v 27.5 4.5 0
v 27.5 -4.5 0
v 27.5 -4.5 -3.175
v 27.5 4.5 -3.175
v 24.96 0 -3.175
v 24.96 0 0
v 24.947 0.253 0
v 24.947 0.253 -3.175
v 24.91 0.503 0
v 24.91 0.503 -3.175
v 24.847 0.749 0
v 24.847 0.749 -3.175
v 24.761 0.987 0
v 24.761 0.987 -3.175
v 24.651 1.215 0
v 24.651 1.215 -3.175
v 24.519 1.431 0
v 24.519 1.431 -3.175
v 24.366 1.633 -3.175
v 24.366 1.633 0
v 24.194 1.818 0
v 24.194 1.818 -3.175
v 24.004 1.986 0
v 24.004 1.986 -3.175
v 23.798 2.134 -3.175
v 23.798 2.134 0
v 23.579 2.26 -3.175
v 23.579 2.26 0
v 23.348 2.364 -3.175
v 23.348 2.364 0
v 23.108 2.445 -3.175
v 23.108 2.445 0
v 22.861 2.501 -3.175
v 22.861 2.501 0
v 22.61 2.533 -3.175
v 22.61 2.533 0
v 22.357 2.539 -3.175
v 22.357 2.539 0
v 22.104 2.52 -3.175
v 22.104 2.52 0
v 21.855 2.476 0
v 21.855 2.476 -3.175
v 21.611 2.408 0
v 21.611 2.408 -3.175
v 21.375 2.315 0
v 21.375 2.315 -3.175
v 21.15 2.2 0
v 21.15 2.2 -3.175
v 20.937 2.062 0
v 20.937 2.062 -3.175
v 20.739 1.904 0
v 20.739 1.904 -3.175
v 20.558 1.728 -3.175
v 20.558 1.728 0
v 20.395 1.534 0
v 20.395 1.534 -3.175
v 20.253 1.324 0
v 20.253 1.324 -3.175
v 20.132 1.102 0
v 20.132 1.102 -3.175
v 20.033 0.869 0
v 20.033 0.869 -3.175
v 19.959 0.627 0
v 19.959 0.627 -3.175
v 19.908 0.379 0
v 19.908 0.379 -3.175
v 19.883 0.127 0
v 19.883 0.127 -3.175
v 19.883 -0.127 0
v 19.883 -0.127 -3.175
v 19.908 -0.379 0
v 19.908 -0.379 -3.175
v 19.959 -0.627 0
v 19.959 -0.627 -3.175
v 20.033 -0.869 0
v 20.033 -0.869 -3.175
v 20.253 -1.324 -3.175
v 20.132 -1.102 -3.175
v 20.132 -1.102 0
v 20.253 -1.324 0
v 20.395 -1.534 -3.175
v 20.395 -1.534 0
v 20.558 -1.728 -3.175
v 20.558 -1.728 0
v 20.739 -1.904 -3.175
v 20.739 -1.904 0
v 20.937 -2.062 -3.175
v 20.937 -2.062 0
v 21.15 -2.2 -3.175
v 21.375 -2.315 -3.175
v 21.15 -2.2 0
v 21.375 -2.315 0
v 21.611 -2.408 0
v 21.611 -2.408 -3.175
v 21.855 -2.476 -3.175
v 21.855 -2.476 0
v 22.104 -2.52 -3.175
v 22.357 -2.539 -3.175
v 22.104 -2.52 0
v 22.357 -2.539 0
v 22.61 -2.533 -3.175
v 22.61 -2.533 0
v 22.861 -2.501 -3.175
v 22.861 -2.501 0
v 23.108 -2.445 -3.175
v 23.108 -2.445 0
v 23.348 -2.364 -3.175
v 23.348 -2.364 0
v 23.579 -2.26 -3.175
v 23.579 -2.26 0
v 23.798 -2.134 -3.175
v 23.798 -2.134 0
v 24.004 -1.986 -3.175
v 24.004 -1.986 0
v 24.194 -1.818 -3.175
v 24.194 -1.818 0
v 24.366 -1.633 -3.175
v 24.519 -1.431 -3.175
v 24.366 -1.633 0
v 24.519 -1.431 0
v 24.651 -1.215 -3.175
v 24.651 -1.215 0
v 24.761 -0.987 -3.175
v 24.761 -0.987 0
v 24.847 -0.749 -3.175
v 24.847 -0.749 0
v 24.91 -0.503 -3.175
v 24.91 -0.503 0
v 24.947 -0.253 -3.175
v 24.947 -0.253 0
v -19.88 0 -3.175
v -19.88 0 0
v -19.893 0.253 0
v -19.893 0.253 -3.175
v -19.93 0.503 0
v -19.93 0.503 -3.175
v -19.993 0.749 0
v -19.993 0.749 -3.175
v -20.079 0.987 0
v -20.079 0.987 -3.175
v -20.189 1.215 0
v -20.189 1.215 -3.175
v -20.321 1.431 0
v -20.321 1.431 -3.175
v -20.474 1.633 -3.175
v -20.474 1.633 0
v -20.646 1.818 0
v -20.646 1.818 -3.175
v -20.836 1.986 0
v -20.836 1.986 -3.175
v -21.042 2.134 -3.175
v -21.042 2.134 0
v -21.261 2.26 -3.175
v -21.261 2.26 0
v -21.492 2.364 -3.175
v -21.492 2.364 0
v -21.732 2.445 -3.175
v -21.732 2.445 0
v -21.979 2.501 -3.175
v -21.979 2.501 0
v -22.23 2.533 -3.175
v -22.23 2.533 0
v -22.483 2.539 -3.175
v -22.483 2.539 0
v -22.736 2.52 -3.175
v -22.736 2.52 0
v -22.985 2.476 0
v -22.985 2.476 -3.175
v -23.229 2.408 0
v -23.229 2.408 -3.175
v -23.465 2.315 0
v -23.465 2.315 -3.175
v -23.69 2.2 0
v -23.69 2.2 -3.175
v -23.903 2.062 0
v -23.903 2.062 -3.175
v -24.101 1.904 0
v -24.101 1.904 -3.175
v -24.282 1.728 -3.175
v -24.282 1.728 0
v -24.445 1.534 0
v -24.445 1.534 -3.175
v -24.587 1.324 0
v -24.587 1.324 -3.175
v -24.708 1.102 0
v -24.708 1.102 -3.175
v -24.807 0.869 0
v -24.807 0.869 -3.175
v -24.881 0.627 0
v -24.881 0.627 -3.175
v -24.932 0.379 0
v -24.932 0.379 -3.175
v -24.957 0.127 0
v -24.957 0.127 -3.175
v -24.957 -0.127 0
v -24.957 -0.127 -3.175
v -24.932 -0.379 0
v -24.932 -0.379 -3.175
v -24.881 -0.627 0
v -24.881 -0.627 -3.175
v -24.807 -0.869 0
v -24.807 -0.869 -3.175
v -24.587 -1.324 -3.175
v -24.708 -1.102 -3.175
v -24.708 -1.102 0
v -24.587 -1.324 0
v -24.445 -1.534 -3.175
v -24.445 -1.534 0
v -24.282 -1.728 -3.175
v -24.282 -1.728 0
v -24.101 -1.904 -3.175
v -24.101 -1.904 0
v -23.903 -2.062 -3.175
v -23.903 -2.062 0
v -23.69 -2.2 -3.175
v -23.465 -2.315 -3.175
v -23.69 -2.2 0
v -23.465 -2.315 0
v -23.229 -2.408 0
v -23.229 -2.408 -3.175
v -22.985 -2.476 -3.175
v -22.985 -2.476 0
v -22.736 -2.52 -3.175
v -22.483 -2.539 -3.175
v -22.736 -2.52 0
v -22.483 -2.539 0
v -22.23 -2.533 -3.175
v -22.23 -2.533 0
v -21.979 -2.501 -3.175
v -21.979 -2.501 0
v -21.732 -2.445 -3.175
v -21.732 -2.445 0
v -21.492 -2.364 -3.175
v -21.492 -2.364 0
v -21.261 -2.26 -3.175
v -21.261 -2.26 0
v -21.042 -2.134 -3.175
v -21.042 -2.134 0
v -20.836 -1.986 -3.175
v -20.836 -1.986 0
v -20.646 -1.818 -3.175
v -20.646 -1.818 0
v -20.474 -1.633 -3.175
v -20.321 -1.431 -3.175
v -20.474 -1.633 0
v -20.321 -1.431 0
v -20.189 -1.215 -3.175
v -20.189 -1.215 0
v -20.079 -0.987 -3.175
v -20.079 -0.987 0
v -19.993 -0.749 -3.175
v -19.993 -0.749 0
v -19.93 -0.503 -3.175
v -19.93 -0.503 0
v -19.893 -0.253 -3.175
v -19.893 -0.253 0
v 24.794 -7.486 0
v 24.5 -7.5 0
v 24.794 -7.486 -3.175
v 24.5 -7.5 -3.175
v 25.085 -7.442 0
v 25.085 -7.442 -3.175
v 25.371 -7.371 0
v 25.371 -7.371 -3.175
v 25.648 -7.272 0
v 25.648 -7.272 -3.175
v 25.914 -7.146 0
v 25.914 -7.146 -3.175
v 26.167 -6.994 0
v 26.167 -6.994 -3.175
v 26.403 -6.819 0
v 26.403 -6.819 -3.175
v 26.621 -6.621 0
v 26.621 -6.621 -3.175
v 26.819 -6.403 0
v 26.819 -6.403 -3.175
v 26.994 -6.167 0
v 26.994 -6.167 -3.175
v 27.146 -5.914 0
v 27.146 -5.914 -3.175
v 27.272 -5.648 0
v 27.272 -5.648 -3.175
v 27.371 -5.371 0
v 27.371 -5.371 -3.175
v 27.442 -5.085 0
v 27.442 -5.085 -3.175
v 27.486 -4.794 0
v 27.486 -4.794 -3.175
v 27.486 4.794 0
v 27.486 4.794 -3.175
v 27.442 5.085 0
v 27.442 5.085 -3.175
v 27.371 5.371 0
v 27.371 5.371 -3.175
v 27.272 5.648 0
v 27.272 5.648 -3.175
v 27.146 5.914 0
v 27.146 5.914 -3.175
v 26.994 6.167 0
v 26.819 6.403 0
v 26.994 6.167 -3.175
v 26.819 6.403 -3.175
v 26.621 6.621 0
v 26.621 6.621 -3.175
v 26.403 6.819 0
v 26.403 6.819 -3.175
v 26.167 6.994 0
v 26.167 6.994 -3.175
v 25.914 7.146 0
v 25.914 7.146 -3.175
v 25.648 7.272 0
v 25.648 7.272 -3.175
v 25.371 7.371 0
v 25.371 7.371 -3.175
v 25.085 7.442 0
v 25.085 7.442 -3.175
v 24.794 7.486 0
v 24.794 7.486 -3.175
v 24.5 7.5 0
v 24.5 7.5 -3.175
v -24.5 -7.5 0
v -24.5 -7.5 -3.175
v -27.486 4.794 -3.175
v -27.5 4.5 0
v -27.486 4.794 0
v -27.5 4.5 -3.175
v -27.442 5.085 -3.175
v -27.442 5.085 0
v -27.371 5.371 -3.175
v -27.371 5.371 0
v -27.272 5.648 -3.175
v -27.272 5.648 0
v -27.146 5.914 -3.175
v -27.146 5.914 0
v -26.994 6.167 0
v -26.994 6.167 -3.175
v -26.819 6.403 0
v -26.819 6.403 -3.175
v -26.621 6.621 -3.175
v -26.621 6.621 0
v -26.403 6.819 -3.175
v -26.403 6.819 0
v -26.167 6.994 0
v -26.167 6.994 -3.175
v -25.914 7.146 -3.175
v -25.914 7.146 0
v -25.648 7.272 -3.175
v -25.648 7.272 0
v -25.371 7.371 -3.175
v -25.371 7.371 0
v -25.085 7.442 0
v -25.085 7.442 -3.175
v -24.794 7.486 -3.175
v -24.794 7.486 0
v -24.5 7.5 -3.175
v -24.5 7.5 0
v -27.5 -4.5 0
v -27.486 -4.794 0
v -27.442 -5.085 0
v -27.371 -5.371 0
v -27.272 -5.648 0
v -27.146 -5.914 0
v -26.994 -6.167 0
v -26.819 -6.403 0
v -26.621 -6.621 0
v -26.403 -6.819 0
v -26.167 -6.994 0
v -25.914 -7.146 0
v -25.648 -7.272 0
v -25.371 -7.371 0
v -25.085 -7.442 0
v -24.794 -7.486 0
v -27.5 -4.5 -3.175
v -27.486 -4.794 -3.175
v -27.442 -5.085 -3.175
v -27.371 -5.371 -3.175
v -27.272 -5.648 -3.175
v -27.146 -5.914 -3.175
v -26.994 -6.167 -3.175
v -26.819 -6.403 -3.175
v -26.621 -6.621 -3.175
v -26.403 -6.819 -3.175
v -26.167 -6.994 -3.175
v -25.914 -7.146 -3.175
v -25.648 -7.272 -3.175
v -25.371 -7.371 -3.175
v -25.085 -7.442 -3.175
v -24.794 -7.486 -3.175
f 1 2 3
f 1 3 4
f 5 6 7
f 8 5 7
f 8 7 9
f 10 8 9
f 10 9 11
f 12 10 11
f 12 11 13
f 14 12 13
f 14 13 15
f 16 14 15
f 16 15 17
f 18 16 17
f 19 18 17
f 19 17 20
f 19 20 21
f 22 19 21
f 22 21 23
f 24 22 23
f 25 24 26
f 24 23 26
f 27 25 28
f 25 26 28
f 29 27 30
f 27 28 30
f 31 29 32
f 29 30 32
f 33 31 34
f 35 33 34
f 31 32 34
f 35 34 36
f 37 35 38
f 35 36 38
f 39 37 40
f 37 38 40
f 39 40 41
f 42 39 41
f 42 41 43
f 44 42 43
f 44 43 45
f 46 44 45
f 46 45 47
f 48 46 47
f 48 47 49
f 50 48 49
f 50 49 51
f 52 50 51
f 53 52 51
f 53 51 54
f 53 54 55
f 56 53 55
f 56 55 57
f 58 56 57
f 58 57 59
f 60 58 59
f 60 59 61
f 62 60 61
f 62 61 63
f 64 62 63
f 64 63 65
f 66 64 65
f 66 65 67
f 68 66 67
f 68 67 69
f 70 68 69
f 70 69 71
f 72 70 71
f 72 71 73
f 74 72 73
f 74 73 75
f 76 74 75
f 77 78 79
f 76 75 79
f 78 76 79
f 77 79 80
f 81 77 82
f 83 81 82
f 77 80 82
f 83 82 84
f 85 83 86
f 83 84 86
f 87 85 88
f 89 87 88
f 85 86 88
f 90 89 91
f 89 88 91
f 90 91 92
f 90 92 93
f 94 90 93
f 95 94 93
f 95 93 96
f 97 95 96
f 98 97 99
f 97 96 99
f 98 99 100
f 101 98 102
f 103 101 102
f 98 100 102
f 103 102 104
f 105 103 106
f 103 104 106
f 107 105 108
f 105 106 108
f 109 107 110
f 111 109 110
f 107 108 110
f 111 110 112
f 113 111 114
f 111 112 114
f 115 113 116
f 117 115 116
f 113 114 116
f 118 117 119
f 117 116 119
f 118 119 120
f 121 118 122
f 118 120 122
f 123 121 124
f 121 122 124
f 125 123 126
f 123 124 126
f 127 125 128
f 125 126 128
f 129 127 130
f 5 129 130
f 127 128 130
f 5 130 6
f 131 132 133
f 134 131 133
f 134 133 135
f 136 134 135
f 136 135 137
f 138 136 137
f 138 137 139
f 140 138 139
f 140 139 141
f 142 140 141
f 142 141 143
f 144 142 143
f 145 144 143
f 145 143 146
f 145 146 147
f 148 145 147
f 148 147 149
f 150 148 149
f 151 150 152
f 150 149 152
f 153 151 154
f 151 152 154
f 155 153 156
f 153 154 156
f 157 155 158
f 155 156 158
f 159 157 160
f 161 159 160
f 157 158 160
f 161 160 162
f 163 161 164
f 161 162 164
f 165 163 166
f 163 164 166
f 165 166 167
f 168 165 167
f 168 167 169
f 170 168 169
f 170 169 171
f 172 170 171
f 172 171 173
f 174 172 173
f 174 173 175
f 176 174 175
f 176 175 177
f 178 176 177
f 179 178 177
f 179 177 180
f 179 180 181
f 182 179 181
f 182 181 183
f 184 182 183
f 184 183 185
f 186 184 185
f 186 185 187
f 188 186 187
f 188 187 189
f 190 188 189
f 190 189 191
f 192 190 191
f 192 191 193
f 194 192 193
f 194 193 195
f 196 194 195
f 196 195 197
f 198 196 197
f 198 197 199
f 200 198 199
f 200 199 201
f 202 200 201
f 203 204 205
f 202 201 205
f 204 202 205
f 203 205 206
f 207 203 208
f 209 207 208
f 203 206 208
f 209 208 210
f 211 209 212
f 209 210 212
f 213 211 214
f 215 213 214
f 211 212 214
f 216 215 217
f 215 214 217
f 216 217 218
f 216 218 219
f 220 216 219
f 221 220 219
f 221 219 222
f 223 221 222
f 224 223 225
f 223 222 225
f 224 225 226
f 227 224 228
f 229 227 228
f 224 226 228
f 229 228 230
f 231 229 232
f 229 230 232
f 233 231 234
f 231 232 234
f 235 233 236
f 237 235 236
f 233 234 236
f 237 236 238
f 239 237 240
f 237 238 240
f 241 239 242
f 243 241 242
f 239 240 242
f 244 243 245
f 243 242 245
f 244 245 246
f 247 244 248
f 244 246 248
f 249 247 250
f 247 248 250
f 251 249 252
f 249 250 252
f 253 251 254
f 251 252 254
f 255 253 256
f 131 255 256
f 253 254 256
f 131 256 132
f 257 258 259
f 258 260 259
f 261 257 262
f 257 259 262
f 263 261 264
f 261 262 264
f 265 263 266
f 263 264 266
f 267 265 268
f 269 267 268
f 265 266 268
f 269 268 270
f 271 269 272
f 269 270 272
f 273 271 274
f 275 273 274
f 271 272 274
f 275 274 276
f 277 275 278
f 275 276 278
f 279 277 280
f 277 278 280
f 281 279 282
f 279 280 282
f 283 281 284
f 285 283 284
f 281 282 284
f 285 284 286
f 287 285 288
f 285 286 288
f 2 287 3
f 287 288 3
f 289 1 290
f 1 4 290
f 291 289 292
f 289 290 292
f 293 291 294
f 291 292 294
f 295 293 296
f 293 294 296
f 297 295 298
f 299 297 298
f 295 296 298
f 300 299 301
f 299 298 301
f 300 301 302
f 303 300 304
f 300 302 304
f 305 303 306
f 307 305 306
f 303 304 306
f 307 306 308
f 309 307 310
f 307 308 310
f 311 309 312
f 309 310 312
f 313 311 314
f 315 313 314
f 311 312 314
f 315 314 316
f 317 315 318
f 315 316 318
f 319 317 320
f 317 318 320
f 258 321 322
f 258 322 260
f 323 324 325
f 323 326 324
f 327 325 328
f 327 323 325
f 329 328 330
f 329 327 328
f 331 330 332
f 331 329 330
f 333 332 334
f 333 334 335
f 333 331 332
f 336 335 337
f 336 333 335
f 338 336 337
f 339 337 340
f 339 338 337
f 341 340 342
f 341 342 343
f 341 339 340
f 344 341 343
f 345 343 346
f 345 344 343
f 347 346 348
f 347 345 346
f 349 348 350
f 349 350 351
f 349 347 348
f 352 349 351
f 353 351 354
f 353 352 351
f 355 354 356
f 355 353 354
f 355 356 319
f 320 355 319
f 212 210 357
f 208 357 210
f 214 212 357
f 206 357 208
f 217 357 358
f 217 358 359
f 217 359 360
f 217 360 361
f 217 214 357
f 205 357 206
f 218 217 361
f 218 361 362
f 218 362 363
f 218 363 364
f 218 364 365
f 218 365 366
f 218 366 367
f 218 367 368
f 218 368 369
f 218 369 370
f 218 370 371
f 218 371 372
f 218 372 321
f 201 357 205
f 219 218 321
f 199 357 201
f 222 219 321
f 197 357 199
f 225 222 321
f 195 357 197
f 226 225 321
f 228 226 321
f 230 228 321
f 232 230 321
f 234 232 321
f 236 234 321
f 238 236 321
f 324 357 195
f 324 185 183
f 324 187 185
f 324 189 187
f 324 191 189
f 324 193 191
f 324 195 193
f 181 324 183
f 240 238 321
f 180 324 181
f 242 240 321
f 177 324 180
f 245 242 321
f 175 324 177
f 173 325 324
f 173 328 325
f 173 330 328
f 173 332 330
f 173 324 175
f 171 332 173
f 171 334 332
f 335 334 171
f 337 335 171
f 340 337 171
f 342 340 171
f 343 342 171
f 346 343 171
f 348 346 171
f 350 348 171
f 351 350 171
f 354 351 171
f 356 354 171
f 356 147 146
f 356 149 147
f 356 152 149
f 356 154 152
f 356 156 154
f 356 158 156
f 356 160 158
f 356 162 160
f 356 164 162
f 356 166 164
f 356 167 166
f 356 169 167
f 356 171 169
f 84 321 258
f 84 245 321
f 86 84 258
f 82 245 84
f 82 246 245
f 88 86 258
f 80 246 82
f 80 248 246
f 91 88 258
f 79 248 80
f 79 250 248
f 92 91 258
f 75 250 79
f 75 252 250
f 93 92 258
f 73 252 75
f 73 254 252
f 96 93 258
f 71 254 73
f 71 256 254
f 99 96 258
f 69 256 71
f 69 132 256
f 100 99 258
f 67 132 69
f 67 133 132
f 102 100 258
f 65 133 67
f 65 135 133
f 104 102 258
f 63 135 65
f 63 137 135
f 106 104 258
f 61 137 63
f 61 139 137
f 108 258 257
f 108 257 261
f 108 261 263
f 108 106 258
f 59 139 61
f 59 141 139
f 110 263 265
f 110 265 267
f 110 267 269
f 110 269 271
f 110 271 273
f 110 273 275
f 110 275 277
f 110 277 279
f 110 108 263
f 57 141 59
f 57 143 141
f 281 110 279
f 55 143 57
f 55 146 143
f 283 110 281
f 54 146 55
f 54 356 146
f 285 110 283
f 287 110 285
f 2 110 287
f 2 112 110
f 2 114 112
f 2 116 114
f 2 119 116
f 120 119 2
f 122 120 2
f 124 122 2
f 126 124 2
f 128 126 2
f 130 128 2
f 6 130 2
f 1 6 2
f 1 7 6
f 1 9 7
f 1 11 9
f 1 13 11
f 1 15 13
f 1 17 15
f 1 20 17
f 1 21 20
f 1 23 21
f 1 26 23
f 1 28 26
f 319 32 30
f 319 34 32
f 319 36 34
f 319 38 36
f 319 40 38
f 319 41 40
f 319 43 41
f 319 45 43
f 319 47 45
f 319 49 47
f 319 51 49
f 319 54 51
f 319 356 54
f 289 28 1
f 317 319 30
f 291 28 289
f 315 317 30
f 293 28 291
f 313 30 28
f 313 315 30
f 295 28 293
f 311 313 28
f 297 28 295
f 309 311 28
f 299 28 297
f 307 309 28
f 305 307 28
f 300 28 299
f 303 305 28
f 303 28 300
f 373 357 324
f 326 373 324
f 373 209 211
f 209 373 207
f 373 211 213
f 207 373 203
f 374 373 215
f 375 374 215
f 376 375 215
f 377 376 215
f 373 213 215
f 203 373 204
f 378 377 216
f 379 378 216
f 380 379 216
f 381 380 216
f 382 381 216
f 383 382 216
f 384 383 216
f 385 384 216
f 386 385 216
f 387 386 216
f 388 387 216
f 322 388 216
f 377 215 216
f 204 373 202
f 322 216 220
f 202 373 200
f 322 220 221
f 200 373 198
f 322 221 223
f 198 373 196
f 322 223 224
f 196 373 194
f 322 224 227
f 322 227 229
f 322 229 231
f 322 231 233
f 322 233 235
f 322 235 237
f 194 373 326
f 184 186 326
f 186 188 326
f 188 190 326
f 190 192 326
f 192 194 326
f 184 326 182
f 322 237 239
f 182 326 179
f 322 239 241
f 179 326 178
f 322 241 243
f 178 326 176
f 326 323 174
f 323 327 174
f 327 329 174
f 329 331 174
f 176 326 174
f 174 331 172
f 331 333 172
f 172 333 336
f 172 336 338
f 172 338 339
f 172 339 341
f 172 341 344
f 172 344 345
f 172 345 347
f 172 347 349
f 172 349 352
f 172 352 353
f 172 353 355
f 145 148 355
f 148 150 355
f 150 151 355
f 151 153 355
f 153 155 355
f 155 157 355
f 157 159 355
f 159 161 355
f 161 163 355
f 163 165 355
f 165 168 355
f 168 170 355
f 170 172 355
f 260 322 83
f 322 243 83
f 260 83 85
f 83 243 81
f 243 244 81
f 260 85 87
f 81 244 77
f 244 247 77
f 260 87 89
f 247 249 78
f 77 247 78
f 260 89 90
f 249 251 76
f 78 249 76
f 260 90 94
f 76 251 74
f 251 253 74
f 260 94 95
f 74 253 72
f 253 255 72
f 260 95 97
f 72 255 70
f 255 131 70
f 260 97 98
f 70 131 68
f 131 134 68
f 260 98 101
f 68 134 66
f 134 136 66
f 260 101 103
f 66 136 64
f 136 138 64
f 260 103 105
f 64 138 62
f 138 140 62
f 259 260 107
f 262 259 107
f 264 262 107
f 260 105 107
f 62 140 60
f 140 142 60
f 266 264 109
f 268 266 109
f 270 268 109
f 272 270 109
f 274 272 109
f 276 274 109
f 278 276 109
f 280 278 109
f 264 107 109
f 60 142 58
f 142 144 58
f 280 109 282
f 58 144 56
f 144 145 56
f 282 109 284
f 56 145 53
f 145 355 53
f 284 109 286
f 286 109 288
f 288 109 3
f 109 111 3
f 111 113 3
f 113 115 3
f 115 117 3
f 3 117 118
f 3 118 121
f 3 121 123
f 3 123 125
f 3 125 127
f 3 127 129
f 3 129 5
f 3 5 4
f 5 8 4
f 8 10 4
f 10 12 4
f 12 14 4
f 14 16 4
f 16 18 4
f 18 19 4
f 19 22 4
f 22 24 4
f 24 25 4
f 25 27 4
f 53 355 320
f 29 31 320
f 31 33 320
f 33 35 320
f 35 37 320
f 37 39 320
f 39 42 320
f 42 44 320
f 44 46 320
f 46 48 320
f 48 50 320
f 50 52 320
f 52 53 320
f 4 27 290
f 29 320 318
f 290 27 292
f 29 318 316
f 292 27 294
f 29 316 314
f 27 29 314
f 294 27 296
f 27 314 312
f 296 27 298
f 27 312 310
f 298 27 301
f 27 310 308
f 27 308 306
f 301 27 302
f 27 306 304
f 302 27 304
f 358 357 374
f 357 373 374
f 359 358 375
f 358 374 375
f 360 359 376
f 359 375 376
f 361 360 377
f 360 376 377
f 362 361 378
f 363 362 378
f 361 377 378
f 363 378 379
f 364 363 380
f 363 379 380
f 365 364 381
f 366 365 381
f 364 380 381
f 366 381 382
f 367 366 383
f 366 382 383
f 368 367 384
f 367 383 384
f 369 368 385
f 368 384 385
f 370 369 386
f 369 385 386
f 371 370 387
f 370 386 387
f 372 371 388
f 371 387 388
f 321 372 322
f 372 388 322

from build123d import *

# Parameters (mm, degrees)
SKETCH1_W          = 55
SKETCH1_H          = 15
BASE_FLANGE1_DEPTH = 3.175
FILLET1_R          = 3
SKETCH7_R          = 2.54
CUT_EXTRUDE1_DEPTH = 29.680666397


# Sheet-metal steps are written as plain solids
with BuildPart() as part:
    # Sketch1 → Base-Flange1 (new body)
    with BuildSketch(Plane.XY):
        Rectangle(SKETCH1_W, SKETCH1_H)
    extrude(amount=-BASE_FLANGE1_DEPTH)

    # Fillet1
    fillet1_edges = [part.edges().sort_by_distance(p)[0] for p in [
        (27.5, -7.5, -1.5875),
        (-27.5, -7.5, -1.5875),
        (-27.5, 7.5, -1.5875),
        (27.5, 7.5, -1.5875),
    ]]
    fillet(fillet1_edges, radius=FILLET1_R)

    # Sketch7 → Cut-Extrude1 (cut, through all)
    with BuildSketch(Plane.XY):
        with Locations((-22.42, 0)):
            Circle(SKETCH7_R)
        with Locations((22.42, 0)):
            Circle(SKETCH7_R)
    extrude(amount=-CUT_EXTRUDE1_DEPTH, mode=Mode.SUBTRACT)


solid = part.part
